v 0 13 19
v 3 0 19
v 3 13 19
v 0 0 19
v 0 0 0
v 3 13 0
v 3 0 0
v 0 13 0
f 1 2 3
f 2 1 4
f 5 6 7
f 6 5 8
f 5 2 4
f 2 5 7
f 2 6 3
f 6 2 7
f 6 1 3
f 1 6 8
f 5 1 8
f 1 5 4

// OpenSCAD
// Generated by SolidPython 1.0.1 on 2020-07-29 00:46:54


cube(size = [3, 13, 19]);
/***********************************************
*********      SolidPython code:      **********
************************************************
 
# import packages: SolidPython
from solid import *
from solid.utils import *
from itertools import chain, combinations, permutations


class Resize:

    def __init__(self, scad_file):
        self.scad_file = scad_file
        #self.scad_file = import_scad(scad_file)
        # cone/cylinder param:
        self.r1 = 0
        self.r2 = 0
        self.h = 0
        # rectangular prism param:
        self.w = 0
        self.l = 0
        # ellipse param:
        self.r = 0

    # import OpenScad code (file name corresponds to shape)


    # classify shape + parameters
    def assign(self, param1, param2, param3):
        if self.scad_file == 'cone.scad':
            self.r1 = param1
            self.r2 = param2
            self.h = param3
        elif self.scad_file == 'cylinder.scad':
            self.r1 = param1
            self.r2 = param2
            self.h = param3
        elif self.scad_file == 'rectangularPrism.scad':
            self.h = param1
            self.l = param2
            self.w = param3
        else:
            self.r = param1
            self.h = param2

    # resize parameters
    def iterate(self):
        x = range(3, 20, 2)
        i = 1
        if self.scad_file == 'cone.scad':
            tempList = list(permutations(x, 2))
            for temp in tempList:
                param1 = temp[0]
                param2 = temp[1]
                filepath = 'produced_scad_files/' + 'cone' + str(param1) + '_' + str(param2) + '_' + '.scad'
                scad_render_to_file(cylinder(h=param1, r1=param2, r2=0), filepath)

        elif self.scad_file == 'cylinder.scad':
            tempList = list(permutations(x, 3))
            for temp in tempList:
                param1 = temp[0]
                param2 = temp[1]
                filepath = 'produced_scad_files/' + 'cylinder' + str(param1) + '_' + str(param2) + '_' + '.scad'
                scad_render_to_file(cylinder(h=param1, r1=param2, r2=param2), filepath)

        elif self.scad_file == 'rectangularPrism.scad':
            tempList = list(permutations(x, 3))
            for temp in tempList:
                param1 = temp[0]
                param2 = temp[1]
                param3 = temp[2]
                filepath = 'produced_scad_files/' + 'rectangularPrism' + str(param1) + '_' + str(param2) + '_' + str(
                    param3) + '.scad'
                scad_render_to_file(cube(size=(param1, param2, param3)), filepath)

        elif self.scad_file == 'ellipse.scad':
            tempList = list(permutations(x, 4))
            for temp in tempList:
                param1 = temp[0]
                param2 = temp[1]
                param3 = temp[2]
                param4 = temp[3]
                filepath = 'produced_scad_files/' + 'ellipse' + str(param1) + '_' + str(param2) + '_' + str(param3) + '_' + str(param4) + '.scad'
                scad_render_to_file(scale([param1, param2, param3])(sphere(r=param4)), filepath)

    def render_to_scadfile(self):
        scad_render_to_file(scad, 'example.scad') 
 
************************************************/
